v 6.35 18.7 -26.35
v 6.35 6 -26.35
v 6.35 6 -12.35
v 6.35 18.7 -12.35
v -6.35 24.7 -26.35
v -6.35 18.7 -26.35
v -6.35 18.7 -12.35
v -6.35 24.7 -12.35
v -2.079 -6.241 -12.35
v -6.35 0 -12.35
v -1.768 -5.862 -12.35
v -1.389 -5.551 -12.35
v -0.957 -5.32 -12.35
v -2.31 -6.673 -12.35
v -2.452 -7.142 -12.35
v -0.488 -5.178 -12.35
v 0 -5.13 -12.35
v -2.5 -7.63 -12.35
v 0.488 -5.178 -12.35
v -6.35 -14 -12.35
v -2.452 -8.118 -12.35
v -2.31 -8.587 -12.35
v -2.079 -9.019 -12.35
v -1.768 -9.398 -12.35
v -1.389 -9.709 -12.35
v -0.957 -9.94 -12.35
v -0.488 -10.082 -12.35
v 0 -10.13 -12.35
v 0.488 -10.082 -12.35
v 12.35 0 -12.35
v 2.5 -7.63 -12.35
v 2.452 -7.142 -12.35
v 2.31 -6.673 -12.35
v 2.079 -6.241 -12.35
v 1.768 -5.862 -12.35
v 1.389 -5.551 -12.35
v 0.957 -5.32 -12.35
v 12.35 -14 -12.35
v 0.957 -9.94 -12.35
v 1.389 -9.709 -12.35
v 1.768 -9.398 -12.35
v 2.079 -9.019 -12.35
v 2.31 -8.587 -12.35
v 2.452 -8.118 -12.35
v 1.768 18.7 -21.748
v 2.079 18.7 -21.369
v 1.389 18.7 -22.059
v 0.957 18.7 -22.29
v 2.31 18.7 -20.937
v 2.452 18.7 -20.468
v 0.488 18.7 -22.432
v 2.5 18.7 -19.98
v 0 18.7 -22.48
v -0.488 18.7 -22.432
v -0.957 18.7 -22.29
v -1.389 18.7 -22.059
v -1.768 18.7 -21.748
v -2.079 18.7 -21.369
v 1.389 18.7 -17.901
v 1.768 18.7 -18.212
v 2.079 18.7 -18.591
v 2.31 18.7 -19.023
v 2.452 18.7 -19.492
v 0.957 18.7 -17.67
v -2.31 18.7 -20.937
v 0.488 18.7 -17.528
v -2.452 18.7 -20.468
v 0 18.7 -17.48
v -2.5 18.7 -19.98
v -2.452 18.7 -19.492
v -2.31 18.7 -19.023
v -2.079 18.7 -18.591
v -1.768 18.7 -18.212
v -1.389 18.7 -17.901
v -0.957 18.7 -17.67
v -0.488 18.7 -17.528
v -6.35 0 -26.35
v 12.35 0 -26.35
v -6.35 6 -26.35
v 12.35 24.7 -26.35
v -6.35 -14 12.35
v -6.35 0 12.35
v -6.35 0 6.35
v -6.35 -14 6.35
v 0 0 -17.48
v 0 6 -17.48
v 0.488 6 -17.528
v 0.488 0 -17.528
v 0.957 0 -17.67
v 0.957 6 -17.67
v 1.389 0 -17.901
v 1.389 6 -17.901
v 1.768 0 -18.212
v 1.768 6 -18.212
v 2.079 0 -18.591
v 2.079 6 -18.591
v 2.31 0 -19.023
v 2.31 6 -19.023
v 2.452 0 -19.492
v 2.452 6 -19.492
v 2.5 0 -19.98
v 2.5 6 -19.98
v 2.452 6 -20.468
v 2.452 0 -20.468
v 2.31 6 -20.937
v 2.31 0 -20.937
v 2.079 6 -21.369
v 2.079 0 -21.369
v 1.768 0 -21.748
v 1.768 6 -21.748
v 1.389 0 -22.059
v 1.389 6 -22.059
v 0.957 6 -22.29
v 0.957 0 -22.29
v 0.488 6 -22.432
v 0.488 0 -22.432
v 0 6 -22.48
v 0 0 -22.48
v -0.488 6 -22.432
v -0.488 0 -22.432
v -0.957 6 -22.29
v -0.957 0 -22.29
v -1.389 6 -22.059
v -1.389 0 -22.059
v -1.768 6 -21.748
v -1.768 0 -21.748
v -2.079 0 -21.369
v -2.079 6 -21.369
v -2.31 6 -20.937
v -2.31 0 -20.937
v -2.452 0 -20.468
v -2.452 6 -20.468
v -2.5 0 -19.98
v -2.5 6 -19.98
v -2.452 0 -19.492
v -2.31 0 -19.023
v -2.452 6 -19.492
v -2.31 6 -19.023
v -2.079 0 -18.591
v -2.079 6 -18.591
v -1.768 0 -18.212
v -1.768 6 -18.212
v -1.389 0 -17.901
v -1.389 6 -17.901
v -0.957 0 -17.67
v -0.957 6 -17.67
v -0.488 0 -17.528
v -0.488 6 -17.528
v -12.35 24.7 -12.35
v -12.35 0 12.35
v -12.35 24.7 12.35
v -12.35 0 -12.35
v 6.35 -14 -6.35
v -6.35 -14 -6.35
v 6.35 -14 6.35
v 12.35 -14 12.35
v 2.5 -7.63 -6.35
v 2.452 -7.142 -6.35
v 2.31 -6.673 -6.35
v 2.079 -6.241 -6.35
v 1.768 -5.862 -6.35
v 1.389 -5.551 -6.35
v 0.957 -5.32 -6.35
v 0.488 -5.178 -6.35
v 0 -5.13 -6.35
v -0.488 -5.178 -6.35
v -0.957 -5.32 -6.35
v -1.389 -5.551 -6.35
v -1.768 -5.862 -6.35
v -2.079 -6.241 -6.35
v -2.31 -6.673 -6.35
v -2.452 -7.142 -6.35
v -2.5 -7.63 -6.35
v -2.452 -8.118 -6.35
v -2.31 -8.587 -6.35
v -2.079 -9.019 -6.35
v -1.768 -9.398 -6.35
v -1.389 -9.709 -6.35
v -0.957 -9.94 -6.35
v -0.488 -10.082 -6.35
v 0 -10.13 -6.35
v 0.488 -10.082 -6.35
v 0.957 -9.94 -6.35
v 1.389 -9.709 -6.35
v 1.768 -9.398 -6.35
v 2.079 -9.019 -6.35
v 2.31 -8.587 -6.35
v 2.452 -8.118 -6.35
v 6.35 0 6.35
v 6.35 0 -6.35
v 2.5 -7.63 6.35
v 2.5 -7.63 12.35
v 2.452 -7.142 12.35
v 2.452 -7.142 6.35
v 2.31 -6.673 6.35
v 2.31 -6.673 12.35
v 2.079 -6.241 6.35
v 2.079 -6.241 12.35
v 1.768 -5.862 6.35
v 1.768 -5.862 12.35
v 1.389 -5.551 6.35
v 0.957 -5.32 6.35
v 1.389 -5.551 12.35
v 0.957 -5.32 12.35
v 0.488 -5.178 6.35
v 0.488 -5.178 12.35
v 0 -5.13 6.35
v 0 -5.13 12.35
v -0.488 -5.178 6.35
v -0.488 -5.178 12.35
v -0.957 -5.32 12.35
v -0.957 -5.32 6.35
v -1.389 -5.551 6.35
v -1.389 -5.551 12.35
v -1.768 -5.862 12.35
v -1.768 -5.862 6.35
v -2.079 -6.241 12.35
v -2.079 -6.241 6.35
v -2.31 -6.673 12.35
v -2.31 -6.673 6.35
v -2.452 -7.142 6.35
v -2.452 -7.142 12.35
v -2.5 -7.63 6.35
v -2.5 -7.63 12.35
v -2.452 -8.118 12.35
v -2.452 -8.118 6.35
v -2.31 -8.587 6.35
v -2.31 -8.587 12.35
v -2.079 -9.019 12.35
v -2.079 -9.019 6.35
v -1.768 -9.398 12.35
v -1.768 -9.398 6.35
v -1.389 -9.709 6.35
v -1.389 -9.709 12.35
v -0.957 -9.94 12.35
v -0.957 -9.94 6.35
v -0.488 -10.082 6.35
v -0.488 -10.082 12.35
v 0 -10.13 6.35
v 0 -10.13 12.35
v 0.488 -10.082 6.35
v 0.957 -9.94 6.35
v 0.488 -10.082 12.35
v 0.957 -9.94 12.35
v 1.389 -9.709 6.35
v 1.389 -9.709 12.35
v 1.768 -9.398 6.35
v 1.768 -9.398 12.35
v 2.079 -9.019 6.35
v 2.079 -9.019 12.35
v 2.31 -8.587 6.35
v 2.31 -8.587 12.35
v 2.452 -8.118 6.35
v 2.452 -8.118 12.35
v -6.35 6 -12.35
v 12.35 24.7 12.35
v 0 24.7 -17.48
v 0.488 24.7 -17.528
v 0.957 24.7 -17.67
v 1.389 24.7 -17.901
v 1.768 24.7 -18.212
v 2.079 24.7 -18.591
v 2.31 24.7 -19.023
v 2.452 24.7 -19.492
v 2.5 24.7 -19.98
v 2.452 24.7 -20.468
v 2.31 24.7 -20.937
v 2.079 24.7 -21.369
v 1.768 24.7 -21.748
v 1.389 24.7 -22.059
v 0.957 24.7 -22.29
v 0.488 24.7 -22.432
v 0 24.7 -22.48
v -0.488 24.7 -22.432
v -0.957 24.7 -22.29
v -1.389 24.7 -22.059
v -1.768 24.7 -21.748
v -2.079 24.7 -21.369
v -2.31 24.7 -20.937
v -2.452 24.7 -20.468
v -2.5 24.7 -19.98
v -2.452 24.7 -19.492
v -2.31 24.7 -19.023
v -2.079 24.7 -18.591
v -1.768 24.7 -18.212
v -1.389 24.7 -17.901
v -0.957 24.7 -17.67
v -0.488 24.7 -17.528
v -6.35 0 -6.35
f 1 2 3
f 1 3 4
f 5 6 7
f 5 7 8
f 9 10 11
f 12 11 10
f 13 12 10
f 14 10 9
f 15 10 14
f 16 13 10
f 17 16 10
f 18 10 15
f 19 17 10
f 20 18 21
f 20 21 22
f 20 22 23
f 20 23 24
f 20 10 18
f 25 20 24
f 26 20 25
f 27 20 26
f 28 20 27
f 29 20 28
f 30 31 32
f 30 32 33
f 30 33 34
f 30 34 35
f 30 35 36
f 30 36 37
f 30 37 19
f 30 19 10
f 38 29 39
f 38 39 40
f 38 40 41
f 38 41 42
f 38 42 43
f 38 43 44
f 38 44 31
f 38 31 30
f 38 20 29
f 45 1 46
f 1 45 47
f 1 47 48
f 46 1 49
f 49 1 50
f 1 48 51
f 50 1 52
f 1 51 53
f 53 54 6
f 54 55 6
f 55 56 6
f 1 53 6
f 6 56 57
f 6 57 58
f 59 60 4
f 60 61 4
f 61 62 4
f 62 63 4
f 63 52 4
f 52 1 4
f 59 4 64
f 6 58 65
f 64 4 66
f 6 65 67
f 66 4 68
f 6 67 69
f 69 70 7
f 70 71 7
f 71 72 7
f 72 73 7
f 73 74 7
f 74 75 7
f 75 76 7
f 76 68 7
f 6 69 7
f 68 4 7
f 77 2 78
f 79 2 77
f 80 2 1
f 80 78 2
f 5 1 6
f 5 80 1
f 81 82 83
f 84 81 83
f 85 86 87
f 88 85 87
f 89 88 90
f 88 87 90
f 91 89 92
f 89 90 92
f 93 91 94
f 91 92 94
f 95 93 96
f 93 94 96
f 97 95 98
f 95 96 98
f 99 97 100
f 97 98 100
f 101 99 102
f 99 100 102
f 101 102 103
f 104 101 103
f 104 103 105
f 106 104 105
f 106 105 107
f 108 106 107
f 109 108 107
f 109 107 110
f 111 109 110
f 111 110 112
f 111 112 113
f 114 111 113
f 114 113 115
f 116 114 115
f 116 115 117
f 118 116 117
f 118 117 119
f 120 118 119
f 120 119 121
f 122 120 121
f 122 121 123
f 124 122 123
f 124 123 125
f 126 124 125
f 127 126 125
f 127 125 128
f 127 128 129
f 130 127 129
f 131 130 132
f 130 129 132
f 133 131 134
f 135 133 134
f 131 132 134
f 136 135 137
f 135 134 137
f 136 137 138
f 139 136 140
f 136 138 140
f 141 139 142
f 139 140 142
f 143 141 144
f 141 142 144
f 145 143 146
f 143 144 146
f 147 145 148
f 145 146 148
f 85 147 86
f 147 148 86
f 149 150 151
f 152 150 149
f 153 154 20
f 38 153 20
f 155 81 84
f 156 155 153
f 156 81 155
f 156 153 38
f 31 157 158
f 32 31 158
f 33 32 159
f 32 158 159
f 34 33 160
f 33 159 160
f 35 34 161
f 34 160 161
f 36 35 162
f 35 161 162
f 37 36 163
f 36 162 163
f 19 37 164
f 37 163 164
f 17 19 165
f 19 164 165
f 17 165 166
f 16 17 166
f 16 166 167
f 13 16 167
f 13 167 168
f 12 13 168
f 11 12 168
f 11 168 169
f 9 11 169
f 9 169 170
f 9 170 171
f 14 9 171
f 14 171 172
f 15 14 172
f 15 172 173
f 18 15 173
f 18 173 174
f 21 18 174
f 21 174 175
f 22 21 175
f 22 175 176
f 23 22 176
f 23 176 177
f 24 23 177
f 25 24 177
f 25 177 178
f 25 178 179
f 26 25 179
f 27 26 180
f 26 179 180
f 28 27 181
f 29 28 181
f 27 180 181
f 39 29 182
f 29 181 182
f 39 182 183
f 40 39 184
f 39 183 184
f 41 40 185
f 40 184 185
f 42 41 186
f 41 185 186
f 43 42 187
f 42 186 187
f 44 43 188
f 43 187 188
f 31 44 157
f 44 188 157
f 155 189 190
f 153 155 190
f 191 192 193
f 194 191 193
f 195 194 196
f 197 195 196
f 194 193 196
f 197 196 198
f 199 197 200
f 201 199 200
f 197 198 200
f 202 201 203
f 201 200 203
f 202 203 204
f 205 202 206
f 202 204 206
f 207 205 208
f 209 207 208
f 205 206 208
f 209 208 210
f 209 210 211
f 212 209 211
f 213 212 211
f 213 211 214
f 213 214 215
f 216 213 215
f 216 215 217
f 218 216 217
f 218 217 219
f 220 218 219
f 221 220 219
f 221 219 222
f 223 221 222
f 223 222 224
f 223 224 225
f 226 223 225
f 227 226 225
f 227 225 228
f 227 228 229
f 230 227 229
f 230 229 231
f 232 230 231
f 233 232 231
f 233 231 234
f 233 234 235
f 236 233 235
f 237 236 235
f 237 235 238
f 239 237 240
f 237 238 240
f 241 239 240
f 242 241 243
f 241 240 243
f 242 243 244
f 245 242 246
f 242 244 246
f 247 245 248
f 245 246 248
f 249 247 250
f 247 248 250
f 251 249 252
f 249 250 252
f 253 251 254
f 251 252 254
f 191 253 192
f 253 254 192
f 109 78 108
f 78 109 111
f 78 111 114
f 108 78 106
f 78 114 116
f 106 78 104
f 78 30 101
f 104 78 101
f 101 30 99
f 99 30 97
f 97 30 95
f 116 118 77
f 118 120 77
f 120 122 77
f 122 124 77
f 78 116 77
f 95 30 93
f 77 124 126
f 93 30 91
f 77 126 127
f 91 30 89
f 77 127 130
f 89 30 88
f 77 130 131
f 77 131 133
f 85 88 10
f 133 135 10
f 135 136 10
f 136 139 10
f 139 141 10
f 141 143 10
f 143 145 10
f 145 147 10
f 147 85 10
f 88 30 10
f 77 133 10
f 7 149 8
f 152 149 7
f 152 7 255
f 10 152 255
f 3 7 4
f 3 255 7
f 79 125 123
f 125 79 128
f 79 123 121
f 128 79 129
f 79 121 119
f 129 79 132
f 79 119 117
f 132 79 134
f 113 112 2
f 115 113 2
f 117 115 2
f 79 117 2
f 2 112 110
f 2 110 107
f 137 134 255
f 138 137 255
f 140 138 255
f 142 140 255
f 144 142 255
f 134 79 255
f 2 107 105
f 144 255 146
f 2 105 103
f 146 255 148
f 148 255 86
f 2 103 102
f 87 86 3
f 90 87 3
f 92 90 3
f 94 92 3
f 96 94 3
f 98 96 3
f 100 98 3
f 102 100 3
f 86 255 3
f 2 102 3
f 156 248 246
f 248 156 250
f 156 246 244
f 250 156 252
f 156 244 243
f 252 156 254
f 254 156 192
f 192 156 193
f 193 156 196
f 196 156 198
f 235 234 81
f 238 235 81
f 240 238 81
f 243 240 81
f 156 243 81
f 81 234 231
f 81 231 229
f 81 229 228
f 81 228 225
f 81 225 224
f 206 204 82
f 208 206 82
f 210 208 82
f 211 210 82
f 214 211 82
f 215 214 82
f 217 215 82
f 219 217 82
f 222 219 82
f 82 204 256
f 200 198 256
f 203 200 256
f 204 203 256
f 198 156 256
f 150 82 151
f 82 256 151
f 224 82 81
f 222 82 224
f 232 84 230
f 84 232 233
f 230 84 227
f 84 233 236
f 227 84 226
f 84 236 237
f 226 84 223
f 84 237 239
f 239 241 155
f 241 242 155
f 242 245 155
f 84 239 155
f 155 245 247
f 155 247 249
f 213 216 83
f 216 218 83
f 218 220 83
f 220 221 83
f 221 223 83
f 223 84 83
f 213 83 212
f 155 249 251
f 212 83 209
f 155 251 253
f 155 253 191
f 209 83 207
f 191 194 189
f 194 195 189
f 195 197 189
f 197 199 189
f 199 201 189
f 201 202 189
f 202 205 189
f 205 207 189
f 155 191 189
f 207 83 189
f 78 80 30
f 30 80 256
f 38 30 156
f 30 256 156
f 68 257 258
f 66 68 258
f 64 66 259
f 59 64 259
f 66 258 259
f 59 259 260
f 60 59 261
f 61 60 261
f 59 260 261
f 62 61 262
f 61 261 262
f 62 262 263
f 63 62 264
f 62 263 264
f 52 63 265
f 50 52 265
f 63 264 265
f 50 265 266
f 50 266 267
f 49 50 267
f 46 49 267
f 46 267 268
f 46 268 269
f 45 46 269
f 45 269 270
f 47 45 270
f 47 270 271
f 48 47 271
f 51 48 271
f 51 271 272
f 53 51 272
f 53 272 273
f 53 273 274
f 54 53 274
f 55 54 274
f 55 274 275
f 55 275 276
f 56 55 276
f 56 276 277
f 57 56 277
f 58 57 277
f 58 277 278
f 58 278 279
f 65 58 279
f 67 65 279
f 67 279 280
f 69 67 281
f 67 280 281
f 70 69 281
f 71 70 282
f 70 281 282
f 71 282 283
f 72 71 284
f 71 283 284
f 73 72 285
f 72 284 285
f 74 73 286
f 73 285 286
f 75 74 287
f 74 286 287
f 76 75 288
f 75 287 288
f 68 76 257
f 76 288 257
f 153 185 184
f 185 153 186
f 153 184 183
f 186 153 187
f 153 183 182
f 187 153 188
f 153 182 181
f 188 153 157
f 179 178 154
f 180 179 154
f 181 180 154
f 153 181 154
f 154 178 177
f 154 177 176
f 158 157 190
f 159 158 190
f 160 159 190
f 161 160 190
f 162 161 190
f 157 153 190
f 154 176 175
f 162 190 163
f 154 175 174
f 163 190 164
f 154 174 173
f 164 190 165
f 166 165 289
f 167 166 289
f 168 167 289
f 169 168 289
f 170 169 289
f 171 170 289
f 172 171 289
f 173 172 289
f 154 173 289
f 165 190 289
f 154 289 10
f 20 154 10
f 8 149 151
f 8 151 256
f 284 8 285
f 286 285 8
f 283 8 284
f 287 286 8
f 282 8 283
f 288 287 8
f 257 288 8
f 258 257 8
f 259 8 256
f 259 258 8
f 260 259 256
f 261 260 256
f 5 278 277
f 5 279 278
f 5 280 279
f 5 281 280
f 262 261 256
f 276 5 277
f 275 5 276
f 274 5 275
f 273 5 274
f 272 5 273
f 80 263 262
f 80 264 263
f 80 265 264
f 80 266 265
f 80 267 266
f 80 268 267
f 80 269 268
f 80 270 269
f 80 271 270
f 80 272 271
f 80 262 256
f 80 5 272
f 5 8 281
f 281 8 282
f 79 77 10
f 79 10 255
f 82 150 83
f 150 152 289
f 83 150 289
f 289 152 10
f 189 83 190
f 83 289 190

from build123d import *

# Parameters (mm, degrees)
SKETCH_1_W          = 24.7
SKETCH_1_H          = 24.7
SKETCH_1_W_2        = 12.7
SKETCH_1_H_2        = 12.7
EXTRUDE_2_DEPTH     = 24.7
EXTRUDE_3_DEPTH     = 14
EXTRUDE_4_DEPTH     = 14
SKETCH_5_R          = 2.5
CUT_EXTRUDE_1_DEPTH = 49.420398594
SKETCH_6_R          = 2.5
CUT_EXTRUDE_2_DEPTH = 48.542638757


with BuildPart() as part:
    # 草图1 → 凸台-拉伸2 (new body)
    # profile 1 of 2: a face of its own
    with BuildSketch(Plane(origin=(0, 0, 0), x_dir=(1, 0, 0), z_dir=(0, 1, 0))):
        Rectangle(SKETCH_1_W, SKETCH_1_H)
        Rectangle(SKETCH_1_W_2, SKETCH_1_H_2, mode=Mode.SUBTRACT)
    # profile 2 of 2: a face of its own
    with BuildSketch(Plane(origin=(0, 0, 0), x_dir=(1, 0, 0), z_dir=(0, 1, 0))):
        Rectangle(SKETCH_1_W_2, SKETCH_1_H_2)
    extrude(amount=EXTRUDE_2_DEPTH)

    # 草图3 → 凸台-拉伸3 (add)
    with BuildSketch(Plane.XZ):
        Polygon((-6.35, 12.35), (-6.35, 6.35), (6.35, 6.35), (6.35, -6.35), (-6.35, -6.35), (-6.35, -12.35), (12.35, -12.35), (12.35, 12.35), align=None)
    extrude(amount=EXTRUDE_3_DEPTH)

    # 草图4 → 凸台-拉伸4 (add)
    with BuildSketch(Plane(origin=(0, 0, -12.35), x_dir=(-1, 0, 0), z_dir=(0, 0, -1))):
        Polygon((6.35, 6), (-6.35, 6), (-6.35, 18.7), (6.35, 18.7), (6.35, 24.7), (-12.35, 24.7), (-12.35, 0), (6.35, 0), align=None)
    extrude(amount=EXTRUDE_4_DEPTH)

    # 草图5 → 切除-拉伸1 (cut, through all)
    with BuildSketch(Plane(origin=(0, 24.7, 0), x_dir=(1, 0, 0), z_dir=(0, 1, 0))):
        with Locations(Location((0, 19.98, 0), (0, 0, 270))):
            Circle(SKETCH_5_R)
    extrude(amount=-CUT_EXTRUDE_1_DEPTH, mode=Mode.SUBTRACT)

    # 草图6 → 切除-拉伸2 (cut, through all)
    with BuildSketch(Plane.XY.offset(12.35)):
        with Locations((0, -7.63)):
            Circle(SKETCH_6_R)
    extrude(amount=-CUT_EXTRUDE_2_DEPTH, mode=Mode.SUBTRACT)


solid = part.part
